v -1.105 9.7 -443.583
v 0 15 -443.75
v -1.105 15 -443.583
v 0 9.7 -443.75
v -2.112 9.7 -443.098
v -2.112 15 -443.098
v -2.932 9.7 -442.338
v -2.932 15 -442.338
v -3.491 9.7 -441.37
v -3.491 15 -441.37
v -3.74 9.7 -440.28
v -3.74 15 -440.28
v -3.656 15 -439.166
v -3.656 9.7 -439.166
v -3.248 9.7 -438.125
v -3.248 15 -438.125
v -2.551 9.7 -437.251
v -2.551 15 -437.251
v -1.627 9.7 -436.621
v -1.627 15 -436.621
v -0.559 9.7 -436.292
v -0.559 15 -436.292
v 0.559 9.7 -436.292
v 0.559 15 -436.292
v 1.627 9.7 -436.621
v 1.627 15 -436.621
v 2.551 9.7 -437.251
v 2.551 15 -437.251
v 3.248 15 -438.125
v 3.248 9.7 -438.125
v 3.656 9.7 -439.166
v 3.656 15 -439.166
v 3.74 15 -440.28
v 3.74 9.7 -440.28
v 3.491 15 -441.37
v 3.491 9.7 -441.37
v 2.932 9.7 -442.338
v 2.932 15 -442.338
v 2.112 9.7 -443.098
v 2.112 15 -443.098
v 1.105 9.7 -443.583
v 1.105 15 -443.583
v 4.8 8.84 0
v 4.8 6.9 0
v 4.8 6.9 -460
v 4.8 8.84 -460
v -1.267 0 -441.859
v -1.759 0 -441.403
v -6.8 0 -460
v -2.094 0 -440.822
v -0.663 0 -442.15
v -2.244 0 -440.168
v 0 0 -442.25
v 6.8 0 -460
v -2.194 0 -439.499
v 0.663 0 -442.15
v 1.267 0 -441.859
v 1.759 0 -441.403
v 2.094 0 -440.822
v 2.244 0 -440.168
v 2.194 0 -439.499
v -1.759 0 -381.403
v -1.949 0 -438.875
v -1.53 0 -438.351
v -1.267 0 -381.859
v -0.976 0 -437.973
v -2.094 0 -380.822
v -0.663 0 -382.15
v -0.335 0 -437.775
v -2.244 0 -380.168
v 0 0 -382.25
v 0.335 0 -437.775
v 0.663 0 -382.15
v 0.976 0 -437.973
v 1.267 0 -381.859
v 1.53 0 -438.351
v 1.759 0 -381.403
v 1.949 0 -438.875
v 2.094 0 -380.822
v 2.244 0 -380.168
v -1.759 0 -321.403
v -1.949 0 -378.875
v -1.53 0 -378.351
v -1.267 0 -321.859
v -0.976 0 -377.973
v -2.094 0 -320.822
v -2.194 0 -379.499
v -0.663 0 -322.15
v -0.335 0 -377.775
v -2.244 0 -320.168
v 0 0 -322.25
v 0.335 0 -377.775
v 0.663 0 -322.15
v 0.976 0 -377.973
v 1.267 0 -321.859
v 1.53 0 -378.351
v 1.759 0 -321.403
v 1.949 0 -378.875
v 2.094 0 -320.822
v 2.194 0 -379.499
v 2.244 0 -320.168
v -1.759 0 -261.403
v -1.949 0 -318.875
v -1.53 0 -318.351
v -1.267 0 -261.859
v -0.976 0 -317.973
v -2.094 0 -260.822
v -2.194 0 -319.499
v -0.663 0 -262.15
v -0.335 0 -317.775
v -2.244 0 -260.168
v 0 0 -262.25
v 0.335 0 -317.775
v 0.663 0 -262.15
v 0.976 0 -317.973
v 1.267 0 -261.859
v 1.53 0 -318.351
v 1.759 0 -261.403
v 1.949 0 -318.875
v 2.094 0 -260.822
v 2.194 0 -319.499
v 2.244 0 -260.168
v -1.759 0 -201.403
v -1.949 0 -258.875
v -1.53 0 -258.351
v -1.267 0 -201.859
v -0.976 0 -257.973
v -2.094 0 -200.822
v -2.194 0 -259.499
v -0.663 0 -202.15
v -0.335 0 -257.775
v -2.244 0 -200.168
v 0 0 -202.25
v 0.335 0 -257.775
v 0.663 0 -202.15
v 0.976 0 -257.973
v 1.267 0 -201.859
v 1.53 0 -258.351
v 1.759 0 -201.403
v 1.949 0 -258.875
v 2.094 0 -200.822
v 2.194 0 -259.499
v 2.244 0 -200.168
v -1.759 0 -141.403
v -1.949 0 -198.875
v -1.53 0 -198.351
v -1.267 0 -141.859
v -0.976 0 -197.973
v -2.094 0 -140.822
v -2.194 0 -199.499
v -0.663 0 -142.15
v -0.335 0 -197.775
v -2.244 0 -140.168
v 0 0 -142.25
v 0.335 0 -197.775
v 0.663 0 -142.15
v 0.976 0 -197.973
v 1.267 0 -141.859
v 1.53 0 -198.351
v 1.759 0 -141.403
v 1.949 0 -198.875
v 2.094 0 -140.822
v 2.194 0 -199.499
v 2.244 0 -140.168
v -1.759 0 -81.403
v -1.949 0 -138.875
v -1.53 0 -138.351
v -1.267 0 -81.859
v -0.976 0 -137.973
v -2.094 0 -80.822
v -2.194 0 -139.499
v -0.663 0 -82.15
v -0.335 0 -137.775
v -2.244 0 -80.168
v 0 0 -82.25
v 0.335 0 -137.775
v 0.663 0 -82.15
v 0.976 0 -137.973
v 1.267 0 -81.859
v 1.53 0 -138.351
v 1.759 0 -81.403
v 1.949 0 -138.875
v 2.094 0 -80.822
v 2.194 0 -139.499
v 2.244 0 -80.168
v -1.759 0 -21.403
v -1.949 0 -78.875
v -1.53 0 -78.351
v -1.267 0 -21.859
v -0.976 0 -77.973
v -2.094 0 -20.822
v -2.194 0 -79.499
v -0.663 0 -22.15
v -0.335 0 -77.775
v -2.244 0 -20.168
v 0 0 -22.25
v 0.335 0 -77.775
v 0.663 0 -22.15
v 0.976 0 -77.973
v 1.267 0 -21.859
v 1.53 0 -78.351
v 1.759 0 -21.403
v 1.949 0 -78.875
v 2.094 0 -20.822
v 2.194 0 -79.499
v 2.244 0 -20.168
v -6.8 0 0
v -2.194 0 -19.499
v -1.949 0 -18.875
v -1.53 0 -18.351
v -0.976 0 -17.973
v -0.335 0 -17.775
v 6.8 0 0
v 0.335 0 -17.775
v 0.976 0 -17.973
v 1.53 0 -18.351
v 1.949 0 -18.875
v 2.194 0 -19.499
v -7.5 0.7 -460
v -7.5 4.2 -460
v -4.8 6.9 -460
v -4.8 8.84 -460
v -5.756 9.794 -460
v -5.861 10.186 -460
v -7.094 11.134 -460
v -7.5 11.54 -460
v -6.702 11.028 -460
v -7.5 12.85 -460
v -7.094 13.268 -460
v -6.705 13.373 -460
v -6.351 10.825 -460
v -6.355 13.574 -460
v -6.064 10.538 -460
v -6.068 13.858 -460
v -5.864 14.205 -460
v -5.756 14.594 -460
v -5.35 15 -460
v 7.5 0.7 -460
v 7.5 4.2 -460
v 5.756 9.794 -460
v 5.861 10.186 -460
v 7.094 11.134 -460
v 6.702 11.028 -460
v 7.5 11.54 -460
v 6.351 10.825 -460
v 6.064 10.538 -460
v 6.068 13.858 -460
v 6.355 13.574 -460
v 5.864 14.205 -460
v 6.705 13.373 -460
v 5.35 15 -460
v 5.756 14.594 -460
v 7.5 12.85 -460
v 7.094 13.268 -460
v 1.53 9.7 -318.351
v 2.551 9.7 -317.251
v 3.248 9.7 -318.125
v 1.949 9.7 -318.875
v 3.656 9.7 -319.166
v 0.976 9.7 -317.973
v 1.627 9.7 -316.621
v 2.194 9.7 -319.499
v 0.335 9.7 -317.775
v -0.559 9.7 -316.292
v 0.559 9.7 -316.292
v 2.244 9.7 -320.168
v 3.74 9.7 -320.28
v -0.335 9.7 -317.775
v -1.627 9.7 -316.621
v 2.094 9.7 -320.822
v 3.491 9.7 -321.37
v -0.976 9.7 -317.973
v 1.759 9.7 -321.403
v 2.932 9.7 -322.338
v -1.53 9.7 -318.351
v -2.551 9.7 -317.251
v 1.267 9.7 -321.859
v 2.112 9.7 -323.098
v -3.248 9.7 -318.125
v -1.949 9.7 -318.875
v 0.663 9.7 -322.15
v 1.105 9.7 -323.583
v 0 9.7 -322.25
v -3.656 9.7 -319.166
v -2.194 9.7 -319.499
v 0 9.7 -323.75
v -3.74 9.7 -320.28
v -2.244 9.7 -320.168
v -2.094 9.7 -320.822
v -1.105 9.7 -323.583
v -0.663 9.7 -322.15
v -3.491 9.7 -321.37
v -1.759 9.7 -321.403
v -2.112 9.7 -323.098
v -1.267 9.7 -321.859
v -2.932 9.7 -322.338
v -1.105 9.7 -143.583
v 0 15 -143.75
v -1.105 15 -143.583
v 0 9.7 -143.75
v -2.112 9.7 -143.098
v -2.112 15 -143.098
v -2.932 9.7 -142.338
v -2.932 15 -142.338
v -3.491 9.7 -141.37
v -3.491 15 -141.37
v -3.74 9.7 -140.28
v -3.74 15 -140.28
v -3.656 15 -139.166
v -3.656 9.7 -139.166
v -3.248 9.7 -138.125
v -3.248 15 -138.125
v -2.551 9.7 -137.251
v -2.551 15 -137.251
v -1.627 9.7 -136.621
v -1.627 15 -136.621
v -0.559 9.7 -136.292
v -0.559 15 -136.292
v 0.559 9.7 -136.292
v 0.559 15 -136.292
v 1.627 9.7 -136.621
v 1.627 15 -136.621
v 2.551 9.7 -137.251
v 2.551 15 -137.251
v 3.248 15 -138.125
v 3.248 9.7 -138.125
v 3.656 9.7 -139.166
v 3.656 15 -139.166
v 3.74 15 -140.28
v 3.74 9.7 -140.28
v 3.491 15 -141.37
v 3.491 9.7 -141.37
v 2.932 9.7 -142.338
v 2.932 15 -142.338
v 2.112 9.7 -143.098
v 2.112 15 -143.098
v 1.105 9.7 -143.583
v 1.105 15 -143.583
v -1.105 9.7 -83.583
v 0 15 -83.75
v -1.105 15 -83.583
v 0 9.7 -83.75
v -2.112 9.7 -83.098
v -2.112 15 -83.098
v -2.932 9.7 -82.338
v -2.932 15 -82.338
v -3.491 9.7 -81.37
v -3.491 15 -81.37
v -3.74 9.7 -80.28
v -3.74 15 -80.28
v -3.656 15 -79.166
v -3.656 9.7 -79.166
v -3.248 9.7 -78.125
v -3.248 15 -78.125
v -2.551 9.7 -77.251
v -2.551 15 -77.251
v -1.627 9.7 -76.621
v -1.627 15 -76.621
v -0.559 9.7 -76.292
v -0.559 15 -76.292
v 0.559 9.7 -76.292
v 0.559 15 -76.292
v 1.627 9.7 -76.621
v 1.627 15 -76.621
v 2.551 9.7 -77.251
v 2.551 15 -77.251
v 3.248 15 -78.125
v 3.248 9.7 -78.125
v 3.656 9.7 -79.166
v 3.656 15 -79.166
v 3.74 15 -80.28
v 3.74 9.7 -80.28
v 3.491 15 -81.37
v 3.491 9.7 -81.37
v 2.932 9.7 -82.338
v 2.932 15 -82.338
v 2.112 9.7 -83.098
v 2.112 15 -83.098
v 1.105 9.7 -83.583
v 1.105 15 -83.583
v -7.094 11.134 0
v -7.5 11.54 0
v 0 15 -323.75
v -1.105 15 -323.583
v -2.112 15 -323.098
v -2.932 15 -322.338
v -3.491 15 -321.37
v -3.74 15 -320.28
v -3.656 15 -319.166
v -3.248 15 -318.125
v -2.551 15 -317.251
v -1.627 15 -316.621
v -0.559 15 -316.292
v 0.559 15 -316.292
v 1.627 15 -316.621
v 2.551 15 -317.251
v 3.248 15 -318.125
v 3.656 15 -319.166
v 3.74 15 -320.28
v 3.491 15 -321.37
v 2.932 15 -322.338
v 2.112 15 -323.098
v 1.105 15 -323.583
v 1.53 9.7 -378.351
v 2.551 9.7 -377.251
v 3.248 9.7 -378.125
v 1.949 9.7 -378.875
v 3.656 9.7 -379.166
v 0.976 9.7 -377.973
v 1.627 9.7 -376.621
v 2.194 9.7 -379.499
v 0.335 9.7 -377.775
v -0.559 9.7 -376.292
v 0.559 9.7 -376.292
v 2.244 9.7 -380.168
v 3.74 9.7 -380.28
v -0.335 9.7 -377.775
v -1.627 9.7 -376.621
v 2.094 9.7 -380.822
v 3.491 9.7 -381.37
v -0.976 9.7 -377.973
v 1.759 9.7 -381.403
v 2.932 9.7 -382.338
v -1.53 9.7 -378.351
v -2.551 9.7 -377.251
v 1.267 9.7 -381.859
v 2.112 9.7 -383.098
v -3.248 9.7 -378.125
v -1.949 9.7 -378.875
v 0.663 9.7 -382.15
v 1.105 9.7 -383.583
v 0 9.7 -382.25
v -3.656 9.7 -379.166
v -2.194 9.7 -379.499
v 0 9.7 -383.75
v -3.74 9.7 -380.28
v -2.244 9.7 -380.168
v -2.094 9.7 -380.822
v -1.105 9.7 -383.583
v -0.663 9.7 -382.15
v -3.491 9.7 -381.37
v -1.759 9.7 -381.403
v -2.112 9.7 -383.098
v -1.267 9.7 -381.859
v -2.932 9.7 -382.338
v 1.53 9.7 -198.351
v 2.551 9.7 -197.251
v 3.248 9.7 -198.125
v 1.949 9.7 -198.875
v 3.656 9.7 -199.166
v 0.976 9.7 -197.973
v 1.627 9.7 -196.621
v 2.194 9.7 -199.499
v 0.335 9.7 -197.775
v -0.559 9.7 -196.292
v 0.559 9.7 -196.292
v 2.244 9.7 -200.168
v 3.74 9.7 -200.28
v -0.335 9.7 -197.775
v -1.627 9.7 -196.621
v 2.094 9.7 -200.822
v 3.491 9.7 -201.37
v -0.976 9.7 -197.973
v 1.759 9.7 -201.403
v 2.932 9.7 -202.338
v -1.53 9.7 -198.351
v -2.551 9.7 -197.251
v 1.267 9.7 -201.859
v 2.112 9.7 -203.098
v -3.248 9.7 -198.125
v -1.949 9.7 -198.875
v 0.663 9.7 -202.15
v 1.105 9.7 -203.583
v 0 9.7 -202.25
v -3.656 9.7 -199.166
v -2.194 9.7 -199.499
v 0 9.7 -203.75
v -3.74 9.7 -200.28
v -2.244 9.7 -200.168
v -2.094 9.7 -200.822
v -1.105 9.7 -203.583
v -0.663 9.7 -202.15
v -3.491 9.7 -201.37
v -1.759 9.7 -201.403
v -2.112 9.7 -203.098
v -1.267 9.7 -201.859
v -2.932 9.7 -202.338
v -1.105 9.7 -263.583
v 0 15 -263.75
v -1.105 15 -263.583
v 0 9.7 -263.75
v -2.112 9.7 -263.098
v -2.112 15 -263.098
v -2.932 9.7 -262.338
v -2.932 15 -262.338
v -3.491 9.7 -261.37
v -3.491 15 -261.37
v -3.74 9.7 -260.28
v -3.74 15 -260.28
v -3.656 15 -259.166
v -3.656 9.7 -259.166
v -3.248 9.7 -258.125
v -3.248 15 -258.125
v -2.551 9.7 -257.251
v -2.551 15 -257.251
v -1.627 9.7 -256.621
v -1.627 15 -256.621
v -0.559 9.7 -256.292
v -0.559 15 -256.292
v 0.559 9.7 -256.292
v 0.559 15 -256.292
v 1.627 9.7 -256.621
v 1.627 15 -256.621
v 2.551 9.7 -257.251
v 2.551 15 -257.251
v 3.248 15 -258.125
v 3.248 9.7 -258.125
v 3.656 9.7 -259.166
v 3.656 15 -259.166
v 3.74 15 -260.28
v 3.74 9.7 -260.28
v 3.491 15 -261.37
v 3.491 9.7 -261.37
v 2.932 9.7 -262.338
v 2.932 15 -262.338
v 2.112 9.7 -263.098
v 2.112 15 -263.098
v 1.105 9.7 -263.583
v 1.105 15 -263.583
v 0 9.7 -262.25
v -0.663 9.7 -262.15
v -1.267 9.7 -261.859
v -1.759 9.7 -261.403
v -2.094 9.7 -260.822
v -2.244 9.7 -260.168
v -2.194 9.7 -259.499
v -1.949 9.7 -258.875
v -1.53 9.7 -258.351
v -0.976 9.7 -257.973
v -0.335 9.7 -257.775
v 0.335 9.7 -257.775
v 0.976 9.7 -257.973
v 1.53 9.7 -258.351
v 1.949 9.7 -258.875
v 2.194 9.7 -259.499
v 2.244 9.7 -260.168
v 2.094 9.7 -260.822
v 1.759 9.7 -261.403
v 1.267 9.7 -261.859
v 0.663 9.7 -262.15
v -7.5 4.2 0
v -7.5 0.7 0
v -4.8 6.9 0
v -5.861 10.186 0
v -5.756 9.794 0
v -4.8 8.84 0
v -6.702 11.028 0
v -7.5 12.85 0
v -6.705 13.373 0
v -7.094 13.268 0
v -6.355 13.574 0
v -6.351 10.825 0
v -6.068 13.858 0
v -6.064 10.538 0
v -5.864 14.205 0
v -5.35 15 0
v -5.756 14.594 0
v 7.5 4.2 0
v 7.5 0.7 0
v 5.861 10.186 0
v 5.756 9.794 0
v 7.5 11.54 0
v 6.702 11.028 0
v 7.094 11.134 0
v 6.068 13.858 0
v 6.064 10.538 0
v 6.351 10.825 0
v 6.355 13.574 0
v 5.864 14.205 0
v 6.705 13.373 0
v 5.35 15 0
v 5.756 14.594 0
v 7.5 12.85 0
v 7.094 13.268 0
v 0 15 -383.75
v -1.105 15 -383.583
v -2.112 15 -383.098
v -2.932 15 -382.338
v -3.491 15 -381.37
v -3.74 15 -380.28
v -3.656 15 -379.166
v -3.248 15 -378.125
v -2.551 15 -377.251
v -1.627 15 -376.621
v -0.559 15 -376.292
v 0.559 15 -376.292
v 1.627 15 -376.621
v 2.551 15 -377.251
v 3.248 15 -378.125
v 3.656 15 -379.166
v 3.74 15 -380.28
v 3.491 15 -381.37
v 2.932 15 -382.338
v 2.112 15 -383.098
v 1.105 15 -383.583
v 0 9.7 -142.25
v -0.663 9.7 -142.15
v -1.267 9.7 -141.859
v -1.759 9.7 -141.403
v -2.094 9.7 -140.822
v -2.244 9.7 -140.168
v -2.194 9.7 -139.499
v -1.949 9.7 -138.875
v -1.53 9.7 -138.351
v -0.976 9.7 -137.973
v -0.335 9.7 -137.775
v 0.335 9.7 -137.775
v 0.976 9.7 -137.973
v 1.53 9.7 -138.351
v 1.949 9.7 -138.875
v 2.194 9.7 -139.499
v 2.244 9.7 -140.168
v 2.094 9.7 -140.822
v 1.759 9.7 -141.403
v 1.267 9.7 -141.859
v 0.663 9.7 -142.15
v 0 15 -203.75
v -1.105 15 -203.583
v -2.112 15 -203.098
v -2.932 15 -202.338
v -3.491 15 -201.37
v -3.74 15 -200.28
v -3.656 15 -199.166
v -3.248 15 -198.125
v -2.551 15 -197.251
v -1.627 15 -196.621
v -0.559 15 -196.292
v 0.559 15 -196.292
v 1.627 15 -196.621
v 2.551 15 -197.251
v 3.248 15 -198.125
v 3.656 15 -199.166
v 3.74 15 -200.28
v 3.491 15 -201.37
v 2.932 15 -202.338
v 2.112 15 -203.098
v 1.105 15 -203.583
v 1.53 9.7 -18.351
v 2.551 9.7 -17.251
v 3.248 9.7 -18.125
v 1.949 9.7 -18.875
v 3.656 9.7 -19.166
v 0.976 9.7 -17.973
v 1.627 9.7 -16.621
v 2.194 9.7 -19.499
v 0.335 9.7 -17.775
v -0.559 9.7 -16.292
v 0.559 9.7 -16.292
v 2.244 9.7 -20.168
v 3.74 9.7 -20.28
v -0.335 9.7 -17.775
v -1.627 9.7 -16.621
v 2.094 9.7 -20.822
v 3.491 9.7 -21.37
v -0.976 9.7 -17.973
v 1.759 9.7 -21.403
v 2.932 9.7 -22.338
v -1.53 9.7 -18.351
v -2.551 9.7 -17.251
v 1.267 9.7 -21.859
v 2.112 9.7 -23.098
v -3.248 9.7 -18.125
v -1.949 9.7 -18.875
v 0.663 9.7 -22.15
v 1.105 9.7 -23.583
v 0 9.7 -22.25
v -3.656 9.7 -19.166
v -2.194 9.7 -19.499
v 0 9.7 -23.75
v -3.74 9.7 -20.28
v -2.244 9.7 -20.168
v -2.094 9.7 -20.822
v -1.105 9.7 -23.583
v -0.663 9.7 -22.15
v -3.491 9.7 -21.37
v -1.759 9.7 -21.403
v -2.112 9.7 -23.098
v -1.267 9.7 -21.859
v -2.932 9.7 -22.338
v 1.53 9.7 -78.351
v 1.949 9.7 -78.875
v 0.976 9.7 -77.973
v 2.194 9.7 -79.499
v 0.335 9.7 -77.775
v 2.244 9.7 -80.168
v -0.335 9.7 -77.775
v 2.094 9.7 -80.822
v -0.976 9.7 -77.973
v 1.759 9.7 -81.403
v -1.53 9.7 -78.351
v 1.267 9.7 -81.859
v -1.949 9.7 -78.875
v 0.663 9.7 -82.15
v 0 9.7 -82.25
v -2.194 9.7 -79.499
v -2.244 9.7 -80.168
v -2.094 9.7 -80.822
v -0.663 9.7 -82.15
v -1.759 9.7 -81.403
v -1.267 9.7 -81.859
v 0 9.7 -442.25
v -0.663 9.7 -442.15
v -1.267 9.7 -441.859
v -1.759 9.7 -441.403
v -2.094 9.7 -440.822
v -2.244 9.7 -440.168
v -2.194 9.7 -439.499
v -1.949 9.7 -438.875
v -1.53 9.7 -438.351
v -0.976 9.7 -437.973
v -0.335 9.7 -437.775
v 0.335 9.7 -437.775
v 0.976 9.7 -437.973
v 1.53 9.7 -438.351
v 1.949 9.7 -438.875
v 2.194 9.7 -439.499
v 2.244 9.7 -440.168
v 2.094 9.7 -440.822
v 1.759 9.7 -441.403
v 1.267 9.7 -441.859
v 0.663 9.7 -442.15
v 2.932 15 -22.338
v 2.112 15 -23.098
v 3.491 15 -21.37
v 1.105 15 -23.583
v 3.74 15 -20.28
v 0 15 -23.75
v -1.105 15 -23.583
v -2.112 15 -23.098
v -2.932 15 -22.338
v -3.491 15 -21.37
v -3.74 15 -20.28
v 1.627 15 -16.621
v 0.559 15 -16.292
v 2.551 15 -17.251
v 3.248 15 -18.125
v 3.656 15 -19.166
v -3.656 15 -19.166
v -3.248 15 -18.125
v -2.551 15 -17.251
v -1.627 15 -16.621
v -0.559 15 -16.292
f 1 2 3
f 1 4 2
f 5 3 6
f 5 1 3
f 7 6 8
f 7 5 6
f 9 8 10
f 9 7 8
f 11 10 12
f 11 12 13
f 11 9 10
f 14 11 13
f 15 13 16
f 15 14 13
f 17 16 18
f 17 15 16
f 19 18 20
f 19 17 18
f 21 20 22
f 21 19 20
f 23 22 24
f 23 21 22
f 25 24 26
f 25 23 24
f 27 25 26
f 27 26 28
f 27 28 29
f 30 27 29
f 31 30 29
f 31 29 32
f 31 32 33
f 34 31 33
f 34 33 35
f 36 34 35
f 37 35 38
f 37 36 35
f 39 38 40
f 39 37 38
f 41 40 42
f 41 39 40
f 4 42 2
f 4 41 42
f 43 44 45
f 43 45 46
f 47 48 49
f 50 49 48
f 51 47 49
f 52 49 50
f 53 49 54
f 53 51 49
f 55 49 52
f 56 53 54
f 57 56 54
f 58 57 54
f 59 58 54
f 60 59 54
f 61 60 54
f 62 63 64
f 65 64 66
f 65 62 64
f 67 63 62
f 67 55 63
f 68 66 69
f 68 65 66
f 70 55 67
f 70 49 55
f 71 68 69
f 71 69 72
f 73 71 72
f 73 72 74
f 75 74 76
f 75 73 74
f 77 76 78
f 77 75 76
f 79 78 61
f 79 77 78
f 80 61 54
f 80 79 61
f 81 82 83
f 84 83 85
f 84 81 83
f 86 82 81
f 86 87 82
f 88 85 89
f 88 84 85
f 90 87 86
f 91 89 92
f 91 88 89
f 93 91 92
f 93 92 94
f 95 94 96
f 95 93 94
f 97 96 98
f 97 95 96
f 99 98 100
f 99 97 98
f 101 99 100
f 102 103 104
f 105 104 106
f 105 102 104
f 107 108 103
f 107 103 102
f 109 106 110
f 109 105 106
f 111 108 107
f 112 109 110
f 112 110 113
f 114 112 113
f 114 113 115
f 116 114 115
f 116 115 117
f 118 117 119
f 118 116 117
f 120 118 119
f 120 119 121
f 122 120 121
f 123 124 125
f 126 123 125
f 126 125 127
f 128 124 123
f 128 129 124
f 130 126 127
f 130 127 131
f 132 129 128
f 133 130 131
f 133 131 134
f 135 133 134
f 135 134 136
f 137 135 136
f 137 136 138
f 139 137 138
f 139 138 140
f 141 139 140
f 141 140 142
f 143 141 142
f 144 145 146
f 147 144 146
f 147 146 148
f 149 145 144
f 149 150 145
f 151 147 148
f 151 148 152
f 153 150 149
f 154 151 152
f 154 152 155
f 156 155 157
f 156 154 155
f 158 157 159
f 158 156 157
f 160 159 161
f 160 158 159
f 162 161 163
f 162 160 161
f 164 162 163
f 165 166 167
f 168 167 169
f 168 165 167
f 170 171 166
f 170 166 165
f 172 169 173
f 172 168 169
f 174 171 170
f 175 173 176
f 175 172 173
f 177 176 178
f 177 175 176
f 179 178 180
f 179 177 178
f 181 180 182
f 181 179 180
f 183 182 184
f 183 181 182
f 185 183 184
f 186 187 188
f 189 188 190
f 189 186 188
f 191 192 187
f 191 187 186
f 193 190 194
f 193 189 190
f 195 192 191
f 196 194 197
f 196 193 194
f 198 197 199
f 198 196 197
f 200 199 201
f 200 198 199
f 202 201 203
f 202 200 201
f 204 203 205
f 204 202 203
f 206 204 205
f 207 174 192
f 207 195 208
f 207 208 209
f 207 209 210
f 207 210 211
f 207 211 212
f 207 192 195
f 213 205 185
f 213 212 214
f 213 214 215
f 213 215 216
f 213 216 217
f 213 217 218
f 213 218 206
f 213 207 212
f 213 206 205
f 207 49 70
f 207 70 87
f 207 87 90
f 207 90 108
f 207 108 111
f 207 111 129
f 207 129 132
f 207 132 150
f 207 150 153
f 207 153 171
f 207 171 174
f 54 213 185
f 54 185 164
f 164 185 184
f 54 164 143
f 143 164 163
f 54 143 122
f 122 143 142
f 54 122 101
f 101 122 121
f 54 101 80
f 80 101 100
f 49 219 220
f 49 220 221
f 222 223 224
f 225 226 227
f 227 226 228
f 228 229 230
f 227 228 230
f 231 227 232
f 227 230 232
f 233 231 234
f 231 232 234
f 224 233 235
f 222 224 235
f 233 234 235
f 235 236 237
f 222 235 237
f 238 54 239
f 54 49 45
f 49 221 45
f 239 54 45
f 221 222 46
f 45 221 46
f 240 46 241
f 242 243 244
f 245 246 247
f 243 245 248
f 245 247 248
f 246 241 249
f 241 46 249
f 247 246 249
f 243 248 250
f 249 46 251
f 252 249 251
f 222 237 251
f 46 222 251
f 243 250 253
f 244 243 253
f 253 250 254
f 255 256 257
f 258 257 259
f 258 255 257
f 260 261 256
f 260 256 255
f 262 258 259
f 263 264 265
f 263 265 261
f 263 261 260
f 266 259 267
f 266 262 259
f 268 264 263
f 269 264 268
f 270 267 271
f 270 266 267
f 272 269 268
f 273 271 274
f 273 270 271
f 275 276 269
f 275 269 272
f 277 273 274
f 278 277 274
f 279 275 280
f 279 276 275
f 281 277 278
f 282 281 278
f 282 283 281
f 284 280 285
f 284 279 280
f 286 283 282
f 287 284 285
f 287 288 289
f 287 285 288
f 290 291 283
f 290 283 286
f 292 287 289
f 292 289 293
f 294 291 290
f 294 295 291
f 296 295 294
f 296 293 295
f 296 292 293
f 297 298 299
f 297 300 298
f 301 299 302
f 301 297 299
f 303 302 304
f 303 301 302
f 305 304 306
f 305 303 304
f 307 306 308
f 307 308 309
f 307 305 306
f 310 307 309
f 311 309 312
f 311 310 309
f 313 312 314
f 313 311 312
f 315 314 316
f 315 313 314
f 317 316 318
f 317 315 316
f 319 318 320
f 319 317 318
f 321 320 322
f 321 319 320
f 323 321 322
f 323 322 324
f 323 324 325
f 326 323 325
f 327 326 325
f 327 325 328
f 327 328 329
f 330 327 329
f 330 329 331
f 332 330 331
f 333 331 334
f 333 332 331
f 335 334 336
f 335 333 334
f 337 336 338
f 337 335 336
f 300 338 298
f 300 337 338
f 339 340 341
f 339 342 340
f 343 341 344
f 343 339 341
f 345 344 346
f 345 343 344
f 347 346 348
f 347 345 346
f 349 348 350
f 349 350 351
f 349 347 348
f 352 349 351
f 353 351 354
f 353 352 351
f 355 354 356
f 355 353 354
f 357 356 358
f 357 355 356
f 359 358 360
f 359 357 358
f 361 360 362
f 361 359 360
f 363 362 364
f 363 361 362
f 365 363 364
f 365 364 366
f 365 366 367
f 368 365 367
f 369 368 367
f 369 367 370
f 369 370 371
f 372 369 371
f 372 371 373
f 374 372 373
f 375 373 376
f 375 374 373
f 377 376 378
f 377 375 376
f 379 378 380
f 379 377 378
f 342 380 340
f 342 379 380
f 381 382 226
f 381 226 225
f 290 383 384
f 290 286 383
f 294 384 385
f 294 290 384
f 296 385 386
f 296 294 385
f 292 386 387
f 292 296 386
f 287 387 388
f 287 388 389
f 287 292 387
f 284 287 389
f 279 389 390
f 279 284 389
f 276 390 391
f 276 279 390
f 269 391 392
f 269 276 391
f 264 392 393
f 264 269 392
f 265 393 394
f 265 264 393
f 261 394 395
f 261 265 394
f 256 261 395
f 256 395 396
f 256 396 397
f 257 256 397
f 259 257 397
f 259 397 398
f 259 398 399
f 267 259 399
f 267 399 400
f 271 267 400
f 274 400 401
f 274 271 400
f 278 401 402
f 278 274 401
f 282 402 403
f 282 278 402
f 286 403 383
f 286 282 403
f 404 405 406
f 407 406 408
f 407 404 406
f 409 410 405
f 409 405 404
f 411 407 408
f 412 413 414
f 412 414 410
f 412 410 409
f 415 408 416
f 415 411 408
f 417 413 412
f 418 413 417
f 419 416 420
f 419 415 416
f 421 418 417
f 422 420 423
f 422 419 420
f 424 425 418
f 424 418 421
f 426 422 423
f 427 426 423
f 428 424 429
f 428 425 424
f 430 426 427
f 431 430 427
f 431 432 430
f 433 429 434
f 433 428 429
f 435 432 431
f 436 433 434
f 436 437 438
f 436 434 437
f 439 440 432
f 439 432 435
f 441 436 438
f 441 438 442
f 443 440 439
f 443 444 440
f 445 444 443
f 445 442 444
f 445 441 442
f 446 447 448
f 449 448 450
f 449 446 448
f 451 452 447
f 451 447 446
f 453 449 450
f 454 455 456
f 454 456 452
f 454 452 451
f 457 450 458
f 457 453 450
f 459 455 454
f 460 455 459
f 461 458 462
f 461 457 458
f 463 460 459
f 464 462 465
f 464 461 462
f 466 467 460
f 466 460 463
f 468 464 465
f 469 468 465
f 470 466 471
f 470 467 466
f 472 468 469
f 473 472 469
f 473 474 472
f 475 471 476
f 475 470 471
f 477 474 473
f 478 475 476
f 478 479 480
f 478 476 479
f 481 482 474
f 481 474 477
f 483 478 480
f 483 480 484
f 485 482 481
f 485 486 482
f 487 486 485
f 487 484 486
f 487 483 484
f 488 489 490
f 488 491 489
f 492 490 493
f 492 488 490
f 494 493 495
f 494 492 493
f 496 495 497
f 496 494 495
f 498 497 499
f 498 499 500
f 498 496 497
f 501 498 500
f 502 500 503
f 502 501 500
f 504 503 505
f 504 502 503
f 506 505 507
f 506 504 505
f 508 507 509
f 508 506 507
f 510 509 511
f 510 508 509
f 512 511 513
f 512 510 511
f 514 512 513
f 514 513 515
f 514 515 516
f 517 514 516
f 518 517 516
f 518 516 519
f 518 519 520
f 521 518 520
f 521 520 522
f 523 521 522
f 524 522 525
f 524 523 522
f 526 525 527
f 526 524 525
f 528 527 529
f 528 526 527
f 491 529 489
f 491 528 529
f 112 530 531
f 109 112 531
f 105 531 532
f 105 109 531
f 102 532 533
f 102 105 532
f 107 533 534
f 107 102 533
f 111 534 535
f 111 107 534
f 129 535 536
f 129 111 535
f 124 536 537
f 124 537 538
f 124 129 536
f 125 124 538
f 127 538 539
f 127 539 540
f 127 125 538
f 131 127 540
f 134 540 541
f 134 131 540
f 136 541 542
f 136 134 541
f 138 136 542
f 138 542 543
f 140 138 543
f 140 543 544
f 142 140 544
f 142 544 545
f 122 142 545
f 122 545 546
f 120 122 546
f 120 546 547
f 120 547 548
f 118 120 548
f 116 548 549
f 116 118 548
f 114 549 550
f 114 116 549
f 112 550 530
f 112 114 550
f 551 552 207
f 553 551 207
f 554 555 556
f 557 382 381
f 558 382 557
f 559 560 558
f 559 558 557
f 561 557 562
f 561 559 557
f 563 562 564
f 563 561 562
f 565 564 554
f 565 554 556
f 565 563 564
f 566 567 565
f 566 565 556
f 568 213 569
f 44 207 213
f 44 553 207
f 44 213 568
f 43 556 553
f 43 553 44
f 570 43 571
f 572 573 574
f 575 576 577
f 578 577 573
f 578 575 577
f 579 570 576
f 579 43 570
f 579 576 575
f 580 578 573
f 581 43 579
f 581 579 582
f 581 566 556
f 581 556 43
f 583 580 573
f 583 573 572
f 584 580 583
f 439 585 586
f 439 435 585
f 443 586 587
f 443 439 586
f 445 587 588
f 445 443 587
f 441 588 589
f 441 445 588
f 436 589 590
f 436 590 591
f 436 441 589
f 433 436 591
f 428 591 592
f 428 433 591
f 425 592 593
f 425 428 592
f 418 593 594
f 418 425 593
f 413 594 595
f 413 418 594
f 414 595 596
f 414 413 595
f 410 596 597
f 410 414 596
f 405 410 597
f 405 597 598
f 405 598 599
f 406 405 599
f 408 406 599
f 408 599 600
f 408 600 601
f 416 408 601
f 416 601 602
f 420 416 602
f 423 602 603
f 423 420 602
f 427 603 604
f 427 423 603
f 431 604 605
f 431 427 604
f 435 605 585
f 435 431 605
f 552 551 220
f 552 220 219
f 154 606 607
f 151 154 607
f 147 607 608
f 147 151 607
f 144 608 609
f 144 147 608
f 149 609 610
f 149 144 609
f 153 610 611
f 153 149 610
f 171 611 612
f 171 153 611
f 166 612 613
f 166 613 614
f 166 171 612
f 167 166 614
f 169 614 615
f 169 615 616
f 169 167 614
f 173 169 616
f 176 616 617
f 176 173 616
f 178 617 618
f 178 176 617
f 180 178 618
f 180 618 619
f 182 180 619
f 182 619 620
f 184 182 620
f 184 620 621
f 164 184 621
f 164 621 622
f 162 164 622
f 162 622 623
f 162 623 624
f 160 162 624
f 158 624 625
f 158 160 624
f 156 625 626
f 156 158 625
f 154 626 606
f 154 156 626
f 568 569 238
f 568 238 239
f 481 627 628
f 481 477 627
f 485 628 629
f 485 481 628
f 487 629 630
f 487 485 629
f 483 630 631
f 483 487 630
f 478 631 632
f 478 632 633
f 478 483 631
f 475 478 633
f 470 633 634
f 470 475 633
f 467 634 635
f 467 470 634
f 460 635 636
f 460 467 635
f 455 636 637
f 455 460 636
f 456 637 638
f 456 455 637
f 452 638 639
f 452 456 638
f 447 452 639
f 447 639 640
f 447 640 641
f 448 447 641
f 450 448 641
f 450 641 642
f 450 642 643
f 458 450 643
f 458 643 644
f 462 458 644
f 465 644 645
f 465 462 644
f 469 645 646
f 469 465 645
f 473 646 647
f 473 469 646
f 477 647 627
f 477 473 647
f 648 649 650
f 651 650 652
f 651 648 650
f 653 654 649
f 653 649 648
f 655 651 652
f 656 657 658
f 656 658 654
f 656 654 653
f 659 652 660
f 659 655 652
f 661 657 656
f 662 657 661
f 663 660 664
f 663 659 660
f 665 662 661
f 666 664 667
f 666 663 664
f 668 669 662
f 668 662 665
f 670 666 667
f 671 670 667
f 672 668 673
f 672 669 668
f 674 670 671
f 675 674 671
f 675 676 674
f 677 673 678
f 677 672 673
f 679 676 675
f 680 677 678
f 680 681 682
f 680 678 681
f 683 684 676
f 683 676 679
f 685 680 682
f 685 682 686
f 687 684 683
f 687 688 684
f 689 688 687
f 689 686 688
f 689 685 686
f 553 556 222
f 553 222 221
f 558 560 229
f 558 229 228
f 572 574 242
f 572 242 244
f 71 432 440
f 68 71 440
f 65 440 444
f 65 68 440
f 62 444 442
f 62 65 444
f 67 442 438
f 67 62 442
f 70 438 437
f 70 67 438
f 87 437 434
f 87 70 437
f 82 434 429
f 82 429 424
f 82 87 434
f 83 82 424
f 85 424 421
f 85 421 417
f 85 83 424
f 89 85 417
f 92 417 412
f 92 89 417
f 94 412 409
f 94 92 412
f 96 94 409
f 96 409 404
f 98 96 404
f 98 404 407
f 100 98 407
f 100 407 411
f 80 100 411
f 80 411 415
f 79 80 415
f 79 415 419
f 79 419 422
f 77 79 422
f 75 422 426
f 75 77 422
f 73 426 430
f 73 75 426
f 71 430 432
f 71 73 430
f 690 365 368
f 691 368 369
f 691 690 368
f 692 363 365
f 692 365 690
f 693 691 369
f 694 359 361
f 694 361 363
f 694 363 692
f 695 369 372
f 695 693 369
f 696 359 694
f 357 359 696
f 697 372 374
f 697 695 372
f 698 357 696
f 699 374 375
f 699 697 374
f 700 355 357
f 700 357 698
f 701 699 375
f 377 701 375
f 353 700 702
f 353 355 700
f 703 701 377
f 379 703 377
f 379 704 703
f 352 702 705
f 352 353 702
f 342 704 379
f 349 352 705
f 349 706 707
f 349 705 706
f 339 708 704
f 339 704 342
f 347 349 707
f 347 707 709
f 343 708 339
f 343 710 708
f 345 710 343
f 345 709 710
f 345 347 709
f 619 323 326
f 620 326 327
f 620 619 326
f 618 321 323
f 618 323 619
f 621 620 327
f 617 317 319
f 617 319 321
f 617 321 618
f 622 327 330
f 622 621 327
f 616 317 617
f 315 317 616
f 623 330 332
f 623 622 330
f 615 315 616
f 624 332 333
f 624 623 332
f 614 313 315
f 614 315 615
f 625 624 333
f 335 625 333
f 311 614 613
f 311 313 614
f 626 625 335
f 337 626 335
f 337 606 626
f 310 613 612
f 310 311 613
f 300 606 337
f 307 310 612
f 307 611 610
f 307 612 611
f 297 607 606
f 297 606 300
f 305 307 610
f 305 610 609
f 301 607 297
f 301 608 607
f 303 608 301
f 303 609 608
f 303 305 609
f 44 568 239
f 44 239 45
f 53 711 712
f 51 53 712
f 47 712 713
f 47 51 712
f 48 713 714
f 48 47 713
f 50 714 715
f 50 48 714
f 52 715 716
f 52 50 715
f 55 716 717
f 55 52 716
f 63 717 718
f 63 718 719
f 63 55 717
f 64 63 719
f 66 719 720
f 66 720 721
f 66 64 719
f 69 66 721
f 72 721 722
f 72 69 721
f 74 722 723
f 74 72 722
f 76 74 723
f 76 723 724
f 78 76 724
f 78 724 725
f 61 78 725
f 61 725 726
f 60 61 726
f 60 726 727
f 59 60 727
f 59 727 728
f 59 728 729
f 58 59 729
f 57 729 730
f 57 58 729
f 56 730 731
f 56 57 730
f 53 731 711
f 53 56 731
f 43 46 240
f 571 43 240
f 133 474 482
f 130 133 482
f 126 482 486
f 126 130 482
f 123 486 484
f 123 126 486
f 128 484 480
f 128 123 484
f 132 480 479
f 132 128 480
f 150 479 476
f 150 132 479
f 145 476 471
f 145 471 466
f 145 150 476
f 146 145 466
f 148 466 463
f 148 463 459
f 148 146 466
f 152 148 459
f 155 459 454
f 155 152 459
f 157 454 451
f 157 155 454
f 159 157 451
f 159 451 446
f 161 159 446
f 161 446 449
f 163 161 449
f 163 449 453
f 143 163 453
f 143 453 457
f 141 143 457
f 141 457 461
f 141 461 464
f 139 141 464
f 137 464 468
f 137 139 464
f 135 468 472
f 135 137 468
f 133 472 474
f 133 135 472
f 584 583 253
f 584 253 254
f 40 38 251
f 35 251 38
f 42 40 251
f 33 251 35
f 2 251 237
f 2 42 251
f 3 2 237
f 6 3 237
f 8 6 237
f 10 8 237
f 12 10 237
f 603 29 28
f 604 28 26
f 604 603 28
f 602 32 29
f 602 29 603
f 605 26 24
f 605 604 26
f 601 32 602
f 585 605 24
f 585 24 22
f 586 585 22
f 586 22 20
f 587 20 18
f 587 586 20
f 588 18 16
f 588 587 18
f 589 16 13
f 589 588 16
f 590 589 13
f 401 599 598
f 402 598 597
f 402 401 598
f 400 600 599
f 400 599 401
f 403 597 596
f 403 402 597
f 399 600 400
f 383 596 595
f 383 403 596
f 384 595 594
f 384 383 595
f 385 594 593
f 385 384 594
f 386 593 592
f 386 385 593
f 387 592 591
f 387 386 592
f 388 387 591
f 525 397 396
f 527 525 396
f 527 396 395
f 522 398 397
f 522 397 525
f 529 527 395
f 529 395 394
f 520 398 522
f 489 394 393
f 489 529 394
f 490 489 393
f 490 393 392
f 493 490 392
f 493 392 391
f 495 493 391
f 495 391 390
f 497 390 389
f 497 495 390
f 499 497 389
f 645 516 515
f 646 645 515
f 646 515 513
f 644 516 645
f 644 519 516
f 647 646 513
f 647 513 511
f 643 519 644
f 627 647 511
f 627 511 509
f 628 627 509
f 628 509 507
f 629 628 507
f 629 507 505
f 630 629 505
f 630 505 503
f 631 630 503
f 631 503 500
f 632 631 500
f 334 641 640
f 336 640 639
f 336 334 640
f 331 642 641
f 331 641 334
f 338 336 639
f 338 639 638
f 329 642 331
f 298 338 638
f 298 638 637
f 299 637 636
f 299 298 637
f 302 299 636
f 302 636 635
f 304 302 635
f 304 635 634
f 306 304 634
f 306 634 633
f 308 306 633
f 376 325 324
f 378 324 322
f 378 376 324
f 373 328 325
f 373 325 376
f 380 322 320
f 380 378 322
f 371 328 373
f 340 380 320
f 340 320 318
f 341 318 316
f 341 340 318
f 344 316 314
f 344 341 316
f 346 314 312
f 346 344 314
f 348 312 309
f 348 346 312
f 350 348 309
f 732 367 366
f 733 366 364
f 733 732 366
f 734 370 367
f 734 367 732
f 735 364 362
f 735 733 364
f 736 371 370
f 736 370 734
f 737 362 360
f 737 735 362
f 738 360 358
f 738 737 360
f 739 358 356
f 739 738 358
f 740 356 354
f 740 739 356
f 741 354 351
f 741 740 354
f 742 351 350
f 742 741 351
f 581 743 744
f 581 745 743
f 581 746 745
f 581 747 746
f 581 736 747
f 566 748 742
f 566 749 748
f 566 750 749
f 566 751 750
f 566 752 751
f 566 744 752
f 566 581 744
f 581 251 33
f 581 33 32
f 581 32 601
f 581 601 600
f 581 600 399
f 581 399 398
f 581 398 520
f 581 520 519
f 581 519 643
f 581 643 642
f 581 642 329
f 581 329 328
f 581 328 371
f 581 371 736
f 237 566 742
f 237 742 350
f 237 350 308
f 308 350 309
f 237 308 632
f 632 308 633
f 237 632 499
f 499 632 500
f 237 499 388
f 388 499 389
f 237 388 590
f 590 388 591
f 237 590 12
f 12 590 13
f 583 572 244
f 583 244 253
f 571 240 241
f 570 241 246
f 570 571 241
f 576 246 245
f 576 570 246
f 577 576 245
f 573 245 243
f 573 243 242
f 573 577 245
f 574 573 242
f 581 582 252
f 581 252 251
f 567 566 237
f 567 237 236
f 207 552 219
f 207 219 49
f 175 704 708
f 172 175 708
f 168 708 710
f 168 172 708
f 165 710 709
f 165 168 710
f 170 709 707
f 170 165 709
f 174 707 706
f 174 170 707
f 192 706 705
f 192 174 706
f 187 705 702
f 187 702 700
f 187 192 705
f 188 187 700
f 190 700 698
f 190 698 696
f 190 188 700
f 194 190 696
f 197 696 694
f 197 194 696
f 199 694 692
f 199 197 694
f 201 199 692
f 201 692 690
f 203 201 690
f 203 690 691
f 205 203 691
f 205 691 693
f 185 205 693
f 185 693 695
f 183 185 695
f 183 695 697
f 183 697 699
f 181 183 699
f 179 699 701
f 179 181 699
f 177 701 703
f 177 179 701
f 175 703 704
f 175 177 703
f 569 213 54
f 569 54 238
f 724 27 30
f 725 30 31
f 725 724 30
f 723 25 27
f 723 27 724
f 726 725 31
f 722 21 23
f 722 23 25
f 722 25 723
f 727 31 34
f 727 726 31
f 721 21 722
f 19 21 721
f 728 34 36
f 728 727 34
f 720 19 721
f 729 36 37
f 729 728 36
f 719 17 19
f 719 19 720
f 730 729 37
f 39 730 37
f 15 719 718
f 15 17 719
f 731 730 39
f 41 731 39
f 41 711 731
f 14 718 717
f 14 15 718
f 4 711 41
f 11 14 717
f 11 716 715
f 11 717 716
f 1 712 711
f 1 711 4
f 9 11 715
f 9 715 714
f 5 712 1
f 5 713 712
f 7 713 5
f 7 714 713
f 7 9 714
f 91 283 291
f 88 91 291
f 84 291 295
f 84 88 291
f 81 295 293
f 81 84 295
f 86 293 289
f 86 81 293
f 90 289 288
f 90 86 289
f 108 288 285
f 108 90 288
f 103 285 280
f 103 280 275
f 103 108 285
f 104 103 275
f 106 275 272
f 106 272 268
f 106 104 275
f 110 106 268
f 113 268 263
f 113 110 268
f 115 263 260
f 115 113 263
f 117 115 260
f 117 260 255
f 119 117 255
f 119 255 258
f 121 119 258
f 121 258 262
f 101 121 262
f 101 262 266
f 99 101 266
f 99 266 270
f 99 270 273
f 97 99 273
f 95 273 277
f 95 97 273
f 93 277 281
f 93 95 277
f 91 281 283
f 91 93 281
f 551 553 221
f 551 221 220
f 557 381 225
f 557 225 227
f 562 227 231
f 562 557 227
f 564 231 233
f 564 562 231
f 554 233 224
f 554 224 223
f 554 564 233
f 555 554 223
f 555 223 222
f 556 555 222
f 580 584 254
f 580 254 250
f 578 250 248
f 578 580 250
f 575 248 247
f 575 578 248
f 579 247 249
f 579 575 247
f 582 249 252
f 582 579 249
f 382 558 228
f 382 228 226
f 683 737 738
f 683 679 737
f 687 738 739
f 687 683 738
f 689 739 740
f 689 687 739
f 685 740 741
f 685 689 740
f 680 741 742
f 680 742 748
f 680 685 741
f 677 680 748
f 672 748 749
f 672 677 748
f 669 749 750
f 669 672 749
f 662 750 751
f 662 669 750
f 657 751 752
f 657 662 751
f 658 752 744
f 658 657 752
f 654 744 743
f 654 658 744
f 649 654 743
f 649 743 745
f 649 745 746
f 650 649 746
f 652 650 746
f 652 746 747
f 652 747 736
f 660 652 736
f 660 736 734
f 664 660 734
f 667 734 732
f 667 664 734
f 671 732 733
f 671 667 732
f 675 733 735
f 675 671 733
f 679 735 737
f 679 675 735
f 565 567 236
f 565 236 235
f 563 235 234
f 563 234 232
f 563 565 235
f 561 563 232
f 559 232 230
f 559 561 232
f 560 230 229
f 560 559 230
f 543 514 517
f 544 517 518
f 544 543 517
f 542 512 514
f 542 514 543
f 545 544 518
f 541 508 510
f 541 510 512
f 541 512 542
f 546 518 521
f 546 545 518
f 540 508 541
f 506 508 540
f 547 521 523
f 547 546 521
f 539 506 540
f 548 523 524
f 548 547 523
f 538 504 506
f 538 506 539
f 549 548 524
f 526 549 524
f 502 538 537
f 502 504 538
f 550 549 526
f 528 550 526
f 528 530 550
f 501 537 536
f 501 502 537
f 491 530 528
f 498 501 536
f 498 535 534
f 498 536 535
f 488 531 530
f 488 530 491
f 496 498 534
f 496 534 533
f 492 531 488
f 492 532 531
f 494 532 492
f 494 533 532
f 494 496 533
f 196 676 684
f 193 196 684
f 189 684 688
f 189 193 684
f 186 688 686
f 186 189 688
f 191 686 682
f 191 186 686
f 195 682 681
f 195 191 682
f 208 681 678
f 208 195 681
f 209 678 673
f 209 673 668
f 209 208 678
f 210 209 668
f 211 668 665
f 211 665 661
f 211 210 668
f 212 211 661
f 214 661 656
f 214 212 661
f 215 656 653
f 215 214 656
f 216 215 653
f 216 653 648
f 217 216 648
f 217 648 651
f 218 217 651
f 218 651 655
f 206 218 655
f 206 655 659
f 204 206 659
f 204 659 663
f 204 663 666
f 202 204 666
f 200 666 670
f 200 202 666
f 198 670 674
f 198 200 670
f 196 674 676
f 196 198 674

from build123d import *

# Parameters (mm, degrees)
EXTRUDE1_DEPTH  = 460
LPATTERN1_COUNT = 8
LPATTERN1_PITCH = 60


with BuildPart() as part:
    # Sketch1 → Extrude1 (new body)
    with BuildSketch(Plane(origin=(-20, 0, 0), x_dir=(1, 0, 0), z_dir=(0, 0, 1))):
        with BuildLine():
            Line((12.5, 0.69999271), (13.199992786, 0))
            Line((13.199992786, 0), (26.800007214, 0))
            Line((26.800007214, 0), (27.5, 0.69999271))
            Line((27.5, 0.69999271), (27.5, 4.2000246))
            Line((27.5, 4.2000246), (24.8000183, 6.9000063))
            Line((24.8000183, 6.9000063), (24.8000183, 8.8400054))
            Line((24.8000183, 8.8400054), (25.755946813, 9.794179118))
            ThreePointArc((25.755946813, 9.794179118), (26.198484624, 10.690600567), (27.09432569, 11.13431209))
            Line((27.09432569, 11.13431209), (27.5, 11.5399866))
            Line((27.5, 11.5399866), (27.5, 12.8500204))
            Line((27.5, 12.8500204), (27.09432569, 13.268442751))
            ThreePointArc((27.09432569, 13.268442751), (26.202460867, 13.706434947), (25.755946813, 14.594063938))
            Line((25.755946813, 14.594063938), (25.3500197, 15))
            Line((25.3500197, 15), (14.6499803, 15))
            Line((14.6499803, 15), (14.244053187, 14.594063938))
            ThreePointArc((14.244053187, 14.594063938), (13.797539133, 13.706434947), (12.90567431, 13.268442751))
            Line((12.90567431, 13.268442751), (12.5, 12.8500204))
            Line((12.5, 12.8500204), (12.5, 11.5399866))
            Line((12.5, 11.5399866), (12.90567431, 11.13431209))
            ThreePointArc((12.90567431, 11.13431209), (13.801515376, 10.690600567), (14.244053187, 9.794179118))
            Line((14.244053187, 9.794179118), (15.1999817, 8.8400054))
            Line((15.1999817, 8.8400054), (15.1999817, 6.9000063))
            Line((15.1999817, 6.9000063), (12.5, 4.2000246))
            Line((12.5, 4.2000246), (12.5, 0.69999271))
        make_face()
    extrude(amount=-EXTRUDE1_DEPTH)

    # Sketch2 → Cut-Revolve1 (revolve, cut)
    with BuildSketch(Plane(origin=(0, 0, 0), x_dir=(0, 0, -1), z_dir=(1, 0, 0))):
        Polygon((20, 15), (23.75, 15), (23.75, 9.7), (22.25, 9.7), (22.25, 0), (20, 0), align=None)
    cut_revolve1 = revolve(axis=Axis((0, 0, -20), (0, 1, 0)), mode=Mode.SUBTRACT)

    # LPattern1: Cut-Revolve1 ×8
    with Locations(*[(0, 0, -i * LPATTERN1_PITCH) for i in range(1, LPATTERN1_COUNT)]):
        add(cut_revolve1, mode=Mode.SUBTRACT)


solid = part.part
